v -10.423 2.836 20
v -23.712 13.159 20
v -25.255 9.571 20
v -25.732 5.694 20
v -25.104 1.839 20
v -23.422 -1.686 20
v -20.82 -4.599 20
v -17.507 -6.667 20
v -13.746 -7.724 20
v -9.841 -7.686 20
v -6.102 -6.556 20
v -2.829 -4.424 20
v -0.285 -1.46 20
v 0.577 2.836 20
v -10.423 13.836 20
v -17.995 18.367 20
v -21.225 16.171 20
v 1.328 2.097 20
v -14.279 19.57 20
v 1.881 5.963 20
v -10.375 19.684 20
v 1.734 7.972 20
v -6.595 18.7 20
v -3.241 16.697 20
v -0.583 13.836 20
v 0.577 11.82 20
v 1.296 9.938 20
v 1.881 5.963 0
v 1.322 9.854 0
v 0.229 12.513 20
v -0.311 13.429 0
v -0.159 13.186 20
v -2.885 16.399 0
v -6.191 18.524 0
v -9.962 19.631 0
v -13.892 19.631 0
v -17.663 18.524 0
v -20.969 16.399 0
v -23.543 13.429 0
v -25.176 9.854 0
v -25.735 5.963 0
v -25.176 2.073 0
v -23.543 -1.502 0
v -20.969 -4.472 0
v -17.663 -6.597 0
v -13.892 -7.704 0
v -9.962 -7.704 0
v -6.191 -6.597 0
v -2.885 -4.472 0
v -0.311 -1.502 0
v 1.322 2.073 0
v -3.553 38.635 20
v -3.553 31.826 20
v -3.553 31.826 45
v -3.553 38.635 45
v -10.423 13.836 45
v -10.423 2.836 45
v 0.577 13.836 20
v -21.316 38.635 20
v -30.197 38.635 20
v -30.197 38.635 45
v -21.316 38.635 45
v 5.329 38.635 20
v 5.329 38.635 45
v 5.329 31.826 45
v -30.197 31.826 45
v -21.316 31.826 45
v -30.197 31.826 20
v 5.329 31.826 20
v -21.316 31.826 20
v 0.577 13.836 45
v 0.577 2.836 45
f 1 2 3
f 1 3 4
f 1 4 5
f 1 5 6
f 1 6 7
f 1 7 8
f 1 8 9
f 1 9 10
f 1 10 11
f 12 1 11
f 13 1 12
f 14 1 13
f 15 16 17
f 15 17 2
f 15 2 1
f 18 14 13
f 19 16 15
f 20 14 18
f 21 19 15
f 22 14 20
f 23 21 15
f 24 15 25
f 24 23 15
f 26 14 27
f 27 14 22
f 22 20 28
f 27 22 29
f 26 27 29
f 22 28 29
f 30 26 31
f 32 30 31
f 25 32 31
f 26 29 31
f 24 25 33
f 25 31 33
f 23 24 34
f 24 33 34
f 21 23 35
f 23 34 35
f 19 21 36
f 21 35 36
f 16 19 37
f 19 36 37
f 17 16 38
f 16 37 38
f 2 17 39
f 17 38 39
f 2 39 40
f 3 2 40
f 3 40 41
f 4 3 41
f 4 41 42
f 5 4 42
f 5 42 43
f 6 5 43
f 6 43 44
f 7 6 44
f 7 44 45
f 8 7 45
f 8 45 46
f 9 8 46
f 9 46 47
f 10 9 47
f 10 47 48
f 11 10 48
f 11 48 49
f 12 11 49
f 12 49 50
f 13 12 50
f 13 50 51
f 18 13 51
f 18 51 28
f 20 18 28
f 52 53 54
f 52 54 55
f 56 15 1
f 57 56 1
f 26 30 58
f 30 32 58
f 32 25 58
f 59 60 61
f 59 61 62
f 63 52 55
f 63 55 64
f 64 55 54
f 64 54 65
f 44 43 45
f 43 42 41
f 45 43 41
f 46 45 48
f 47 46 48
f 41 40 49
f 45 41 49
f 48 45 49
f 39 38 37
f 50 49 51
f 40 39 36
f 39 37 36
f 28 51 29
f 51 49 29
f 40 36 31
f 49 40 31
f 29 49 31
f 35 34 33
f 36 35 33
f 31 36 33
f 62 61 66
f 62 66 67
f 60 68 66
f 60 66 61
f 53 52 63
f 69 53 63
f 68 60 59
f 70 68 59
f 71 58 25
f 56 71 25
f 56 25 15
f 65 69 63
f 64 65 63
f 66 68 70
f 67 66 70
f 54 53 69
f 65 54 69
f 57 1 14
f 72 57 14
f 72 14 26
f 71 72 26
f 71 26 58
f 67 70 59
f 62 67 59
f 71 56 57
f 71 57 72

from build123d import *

# Parameters (mm, degrees)
F0_R     = 13.807881
F1_DEPTH = 20
F2_W     = 8.881576
F2_H     = 6.809212
F2_W_2   = 8.881579
F3_DEPTH = 25
F5_DEPTH = 25


with BuildPart() as f1:
    # F0 (on Top) → F1 (new body)
    with BuildSketch(Plane.XY):
        with Locations((-11.926957, 5.963478)):
            Circle(F0_R)
    extrude(amount=F1_DEPTH)

    # F4 (on face) → F5 (join)
    with BuildSketch(Plane.XY.offset(20)):
        Polygon((0.577498, 13.835808), (-10.422502, 13.835808), (-10.422502, 2.835808), (-4.922502, 2.835808), (0.577498, 2.835808), align=None)
    extrude(amount=F5_DEPTH)


with BuildPart() as f3:
    # F2 (on face) → F3 (new body)
    with BuildSketch(Plane.XY.offset(20)):
        with Locations((-25.756581, 35.230268)):
            Rectangle(F2_W, F2_H)
        with Locations((0.888157, 35.230268)):
            Rectangle(F2_W_2, F2_H)
    extrude(amount=F3_DEPTH)


solid = Compound([f1.part, f3.part])
